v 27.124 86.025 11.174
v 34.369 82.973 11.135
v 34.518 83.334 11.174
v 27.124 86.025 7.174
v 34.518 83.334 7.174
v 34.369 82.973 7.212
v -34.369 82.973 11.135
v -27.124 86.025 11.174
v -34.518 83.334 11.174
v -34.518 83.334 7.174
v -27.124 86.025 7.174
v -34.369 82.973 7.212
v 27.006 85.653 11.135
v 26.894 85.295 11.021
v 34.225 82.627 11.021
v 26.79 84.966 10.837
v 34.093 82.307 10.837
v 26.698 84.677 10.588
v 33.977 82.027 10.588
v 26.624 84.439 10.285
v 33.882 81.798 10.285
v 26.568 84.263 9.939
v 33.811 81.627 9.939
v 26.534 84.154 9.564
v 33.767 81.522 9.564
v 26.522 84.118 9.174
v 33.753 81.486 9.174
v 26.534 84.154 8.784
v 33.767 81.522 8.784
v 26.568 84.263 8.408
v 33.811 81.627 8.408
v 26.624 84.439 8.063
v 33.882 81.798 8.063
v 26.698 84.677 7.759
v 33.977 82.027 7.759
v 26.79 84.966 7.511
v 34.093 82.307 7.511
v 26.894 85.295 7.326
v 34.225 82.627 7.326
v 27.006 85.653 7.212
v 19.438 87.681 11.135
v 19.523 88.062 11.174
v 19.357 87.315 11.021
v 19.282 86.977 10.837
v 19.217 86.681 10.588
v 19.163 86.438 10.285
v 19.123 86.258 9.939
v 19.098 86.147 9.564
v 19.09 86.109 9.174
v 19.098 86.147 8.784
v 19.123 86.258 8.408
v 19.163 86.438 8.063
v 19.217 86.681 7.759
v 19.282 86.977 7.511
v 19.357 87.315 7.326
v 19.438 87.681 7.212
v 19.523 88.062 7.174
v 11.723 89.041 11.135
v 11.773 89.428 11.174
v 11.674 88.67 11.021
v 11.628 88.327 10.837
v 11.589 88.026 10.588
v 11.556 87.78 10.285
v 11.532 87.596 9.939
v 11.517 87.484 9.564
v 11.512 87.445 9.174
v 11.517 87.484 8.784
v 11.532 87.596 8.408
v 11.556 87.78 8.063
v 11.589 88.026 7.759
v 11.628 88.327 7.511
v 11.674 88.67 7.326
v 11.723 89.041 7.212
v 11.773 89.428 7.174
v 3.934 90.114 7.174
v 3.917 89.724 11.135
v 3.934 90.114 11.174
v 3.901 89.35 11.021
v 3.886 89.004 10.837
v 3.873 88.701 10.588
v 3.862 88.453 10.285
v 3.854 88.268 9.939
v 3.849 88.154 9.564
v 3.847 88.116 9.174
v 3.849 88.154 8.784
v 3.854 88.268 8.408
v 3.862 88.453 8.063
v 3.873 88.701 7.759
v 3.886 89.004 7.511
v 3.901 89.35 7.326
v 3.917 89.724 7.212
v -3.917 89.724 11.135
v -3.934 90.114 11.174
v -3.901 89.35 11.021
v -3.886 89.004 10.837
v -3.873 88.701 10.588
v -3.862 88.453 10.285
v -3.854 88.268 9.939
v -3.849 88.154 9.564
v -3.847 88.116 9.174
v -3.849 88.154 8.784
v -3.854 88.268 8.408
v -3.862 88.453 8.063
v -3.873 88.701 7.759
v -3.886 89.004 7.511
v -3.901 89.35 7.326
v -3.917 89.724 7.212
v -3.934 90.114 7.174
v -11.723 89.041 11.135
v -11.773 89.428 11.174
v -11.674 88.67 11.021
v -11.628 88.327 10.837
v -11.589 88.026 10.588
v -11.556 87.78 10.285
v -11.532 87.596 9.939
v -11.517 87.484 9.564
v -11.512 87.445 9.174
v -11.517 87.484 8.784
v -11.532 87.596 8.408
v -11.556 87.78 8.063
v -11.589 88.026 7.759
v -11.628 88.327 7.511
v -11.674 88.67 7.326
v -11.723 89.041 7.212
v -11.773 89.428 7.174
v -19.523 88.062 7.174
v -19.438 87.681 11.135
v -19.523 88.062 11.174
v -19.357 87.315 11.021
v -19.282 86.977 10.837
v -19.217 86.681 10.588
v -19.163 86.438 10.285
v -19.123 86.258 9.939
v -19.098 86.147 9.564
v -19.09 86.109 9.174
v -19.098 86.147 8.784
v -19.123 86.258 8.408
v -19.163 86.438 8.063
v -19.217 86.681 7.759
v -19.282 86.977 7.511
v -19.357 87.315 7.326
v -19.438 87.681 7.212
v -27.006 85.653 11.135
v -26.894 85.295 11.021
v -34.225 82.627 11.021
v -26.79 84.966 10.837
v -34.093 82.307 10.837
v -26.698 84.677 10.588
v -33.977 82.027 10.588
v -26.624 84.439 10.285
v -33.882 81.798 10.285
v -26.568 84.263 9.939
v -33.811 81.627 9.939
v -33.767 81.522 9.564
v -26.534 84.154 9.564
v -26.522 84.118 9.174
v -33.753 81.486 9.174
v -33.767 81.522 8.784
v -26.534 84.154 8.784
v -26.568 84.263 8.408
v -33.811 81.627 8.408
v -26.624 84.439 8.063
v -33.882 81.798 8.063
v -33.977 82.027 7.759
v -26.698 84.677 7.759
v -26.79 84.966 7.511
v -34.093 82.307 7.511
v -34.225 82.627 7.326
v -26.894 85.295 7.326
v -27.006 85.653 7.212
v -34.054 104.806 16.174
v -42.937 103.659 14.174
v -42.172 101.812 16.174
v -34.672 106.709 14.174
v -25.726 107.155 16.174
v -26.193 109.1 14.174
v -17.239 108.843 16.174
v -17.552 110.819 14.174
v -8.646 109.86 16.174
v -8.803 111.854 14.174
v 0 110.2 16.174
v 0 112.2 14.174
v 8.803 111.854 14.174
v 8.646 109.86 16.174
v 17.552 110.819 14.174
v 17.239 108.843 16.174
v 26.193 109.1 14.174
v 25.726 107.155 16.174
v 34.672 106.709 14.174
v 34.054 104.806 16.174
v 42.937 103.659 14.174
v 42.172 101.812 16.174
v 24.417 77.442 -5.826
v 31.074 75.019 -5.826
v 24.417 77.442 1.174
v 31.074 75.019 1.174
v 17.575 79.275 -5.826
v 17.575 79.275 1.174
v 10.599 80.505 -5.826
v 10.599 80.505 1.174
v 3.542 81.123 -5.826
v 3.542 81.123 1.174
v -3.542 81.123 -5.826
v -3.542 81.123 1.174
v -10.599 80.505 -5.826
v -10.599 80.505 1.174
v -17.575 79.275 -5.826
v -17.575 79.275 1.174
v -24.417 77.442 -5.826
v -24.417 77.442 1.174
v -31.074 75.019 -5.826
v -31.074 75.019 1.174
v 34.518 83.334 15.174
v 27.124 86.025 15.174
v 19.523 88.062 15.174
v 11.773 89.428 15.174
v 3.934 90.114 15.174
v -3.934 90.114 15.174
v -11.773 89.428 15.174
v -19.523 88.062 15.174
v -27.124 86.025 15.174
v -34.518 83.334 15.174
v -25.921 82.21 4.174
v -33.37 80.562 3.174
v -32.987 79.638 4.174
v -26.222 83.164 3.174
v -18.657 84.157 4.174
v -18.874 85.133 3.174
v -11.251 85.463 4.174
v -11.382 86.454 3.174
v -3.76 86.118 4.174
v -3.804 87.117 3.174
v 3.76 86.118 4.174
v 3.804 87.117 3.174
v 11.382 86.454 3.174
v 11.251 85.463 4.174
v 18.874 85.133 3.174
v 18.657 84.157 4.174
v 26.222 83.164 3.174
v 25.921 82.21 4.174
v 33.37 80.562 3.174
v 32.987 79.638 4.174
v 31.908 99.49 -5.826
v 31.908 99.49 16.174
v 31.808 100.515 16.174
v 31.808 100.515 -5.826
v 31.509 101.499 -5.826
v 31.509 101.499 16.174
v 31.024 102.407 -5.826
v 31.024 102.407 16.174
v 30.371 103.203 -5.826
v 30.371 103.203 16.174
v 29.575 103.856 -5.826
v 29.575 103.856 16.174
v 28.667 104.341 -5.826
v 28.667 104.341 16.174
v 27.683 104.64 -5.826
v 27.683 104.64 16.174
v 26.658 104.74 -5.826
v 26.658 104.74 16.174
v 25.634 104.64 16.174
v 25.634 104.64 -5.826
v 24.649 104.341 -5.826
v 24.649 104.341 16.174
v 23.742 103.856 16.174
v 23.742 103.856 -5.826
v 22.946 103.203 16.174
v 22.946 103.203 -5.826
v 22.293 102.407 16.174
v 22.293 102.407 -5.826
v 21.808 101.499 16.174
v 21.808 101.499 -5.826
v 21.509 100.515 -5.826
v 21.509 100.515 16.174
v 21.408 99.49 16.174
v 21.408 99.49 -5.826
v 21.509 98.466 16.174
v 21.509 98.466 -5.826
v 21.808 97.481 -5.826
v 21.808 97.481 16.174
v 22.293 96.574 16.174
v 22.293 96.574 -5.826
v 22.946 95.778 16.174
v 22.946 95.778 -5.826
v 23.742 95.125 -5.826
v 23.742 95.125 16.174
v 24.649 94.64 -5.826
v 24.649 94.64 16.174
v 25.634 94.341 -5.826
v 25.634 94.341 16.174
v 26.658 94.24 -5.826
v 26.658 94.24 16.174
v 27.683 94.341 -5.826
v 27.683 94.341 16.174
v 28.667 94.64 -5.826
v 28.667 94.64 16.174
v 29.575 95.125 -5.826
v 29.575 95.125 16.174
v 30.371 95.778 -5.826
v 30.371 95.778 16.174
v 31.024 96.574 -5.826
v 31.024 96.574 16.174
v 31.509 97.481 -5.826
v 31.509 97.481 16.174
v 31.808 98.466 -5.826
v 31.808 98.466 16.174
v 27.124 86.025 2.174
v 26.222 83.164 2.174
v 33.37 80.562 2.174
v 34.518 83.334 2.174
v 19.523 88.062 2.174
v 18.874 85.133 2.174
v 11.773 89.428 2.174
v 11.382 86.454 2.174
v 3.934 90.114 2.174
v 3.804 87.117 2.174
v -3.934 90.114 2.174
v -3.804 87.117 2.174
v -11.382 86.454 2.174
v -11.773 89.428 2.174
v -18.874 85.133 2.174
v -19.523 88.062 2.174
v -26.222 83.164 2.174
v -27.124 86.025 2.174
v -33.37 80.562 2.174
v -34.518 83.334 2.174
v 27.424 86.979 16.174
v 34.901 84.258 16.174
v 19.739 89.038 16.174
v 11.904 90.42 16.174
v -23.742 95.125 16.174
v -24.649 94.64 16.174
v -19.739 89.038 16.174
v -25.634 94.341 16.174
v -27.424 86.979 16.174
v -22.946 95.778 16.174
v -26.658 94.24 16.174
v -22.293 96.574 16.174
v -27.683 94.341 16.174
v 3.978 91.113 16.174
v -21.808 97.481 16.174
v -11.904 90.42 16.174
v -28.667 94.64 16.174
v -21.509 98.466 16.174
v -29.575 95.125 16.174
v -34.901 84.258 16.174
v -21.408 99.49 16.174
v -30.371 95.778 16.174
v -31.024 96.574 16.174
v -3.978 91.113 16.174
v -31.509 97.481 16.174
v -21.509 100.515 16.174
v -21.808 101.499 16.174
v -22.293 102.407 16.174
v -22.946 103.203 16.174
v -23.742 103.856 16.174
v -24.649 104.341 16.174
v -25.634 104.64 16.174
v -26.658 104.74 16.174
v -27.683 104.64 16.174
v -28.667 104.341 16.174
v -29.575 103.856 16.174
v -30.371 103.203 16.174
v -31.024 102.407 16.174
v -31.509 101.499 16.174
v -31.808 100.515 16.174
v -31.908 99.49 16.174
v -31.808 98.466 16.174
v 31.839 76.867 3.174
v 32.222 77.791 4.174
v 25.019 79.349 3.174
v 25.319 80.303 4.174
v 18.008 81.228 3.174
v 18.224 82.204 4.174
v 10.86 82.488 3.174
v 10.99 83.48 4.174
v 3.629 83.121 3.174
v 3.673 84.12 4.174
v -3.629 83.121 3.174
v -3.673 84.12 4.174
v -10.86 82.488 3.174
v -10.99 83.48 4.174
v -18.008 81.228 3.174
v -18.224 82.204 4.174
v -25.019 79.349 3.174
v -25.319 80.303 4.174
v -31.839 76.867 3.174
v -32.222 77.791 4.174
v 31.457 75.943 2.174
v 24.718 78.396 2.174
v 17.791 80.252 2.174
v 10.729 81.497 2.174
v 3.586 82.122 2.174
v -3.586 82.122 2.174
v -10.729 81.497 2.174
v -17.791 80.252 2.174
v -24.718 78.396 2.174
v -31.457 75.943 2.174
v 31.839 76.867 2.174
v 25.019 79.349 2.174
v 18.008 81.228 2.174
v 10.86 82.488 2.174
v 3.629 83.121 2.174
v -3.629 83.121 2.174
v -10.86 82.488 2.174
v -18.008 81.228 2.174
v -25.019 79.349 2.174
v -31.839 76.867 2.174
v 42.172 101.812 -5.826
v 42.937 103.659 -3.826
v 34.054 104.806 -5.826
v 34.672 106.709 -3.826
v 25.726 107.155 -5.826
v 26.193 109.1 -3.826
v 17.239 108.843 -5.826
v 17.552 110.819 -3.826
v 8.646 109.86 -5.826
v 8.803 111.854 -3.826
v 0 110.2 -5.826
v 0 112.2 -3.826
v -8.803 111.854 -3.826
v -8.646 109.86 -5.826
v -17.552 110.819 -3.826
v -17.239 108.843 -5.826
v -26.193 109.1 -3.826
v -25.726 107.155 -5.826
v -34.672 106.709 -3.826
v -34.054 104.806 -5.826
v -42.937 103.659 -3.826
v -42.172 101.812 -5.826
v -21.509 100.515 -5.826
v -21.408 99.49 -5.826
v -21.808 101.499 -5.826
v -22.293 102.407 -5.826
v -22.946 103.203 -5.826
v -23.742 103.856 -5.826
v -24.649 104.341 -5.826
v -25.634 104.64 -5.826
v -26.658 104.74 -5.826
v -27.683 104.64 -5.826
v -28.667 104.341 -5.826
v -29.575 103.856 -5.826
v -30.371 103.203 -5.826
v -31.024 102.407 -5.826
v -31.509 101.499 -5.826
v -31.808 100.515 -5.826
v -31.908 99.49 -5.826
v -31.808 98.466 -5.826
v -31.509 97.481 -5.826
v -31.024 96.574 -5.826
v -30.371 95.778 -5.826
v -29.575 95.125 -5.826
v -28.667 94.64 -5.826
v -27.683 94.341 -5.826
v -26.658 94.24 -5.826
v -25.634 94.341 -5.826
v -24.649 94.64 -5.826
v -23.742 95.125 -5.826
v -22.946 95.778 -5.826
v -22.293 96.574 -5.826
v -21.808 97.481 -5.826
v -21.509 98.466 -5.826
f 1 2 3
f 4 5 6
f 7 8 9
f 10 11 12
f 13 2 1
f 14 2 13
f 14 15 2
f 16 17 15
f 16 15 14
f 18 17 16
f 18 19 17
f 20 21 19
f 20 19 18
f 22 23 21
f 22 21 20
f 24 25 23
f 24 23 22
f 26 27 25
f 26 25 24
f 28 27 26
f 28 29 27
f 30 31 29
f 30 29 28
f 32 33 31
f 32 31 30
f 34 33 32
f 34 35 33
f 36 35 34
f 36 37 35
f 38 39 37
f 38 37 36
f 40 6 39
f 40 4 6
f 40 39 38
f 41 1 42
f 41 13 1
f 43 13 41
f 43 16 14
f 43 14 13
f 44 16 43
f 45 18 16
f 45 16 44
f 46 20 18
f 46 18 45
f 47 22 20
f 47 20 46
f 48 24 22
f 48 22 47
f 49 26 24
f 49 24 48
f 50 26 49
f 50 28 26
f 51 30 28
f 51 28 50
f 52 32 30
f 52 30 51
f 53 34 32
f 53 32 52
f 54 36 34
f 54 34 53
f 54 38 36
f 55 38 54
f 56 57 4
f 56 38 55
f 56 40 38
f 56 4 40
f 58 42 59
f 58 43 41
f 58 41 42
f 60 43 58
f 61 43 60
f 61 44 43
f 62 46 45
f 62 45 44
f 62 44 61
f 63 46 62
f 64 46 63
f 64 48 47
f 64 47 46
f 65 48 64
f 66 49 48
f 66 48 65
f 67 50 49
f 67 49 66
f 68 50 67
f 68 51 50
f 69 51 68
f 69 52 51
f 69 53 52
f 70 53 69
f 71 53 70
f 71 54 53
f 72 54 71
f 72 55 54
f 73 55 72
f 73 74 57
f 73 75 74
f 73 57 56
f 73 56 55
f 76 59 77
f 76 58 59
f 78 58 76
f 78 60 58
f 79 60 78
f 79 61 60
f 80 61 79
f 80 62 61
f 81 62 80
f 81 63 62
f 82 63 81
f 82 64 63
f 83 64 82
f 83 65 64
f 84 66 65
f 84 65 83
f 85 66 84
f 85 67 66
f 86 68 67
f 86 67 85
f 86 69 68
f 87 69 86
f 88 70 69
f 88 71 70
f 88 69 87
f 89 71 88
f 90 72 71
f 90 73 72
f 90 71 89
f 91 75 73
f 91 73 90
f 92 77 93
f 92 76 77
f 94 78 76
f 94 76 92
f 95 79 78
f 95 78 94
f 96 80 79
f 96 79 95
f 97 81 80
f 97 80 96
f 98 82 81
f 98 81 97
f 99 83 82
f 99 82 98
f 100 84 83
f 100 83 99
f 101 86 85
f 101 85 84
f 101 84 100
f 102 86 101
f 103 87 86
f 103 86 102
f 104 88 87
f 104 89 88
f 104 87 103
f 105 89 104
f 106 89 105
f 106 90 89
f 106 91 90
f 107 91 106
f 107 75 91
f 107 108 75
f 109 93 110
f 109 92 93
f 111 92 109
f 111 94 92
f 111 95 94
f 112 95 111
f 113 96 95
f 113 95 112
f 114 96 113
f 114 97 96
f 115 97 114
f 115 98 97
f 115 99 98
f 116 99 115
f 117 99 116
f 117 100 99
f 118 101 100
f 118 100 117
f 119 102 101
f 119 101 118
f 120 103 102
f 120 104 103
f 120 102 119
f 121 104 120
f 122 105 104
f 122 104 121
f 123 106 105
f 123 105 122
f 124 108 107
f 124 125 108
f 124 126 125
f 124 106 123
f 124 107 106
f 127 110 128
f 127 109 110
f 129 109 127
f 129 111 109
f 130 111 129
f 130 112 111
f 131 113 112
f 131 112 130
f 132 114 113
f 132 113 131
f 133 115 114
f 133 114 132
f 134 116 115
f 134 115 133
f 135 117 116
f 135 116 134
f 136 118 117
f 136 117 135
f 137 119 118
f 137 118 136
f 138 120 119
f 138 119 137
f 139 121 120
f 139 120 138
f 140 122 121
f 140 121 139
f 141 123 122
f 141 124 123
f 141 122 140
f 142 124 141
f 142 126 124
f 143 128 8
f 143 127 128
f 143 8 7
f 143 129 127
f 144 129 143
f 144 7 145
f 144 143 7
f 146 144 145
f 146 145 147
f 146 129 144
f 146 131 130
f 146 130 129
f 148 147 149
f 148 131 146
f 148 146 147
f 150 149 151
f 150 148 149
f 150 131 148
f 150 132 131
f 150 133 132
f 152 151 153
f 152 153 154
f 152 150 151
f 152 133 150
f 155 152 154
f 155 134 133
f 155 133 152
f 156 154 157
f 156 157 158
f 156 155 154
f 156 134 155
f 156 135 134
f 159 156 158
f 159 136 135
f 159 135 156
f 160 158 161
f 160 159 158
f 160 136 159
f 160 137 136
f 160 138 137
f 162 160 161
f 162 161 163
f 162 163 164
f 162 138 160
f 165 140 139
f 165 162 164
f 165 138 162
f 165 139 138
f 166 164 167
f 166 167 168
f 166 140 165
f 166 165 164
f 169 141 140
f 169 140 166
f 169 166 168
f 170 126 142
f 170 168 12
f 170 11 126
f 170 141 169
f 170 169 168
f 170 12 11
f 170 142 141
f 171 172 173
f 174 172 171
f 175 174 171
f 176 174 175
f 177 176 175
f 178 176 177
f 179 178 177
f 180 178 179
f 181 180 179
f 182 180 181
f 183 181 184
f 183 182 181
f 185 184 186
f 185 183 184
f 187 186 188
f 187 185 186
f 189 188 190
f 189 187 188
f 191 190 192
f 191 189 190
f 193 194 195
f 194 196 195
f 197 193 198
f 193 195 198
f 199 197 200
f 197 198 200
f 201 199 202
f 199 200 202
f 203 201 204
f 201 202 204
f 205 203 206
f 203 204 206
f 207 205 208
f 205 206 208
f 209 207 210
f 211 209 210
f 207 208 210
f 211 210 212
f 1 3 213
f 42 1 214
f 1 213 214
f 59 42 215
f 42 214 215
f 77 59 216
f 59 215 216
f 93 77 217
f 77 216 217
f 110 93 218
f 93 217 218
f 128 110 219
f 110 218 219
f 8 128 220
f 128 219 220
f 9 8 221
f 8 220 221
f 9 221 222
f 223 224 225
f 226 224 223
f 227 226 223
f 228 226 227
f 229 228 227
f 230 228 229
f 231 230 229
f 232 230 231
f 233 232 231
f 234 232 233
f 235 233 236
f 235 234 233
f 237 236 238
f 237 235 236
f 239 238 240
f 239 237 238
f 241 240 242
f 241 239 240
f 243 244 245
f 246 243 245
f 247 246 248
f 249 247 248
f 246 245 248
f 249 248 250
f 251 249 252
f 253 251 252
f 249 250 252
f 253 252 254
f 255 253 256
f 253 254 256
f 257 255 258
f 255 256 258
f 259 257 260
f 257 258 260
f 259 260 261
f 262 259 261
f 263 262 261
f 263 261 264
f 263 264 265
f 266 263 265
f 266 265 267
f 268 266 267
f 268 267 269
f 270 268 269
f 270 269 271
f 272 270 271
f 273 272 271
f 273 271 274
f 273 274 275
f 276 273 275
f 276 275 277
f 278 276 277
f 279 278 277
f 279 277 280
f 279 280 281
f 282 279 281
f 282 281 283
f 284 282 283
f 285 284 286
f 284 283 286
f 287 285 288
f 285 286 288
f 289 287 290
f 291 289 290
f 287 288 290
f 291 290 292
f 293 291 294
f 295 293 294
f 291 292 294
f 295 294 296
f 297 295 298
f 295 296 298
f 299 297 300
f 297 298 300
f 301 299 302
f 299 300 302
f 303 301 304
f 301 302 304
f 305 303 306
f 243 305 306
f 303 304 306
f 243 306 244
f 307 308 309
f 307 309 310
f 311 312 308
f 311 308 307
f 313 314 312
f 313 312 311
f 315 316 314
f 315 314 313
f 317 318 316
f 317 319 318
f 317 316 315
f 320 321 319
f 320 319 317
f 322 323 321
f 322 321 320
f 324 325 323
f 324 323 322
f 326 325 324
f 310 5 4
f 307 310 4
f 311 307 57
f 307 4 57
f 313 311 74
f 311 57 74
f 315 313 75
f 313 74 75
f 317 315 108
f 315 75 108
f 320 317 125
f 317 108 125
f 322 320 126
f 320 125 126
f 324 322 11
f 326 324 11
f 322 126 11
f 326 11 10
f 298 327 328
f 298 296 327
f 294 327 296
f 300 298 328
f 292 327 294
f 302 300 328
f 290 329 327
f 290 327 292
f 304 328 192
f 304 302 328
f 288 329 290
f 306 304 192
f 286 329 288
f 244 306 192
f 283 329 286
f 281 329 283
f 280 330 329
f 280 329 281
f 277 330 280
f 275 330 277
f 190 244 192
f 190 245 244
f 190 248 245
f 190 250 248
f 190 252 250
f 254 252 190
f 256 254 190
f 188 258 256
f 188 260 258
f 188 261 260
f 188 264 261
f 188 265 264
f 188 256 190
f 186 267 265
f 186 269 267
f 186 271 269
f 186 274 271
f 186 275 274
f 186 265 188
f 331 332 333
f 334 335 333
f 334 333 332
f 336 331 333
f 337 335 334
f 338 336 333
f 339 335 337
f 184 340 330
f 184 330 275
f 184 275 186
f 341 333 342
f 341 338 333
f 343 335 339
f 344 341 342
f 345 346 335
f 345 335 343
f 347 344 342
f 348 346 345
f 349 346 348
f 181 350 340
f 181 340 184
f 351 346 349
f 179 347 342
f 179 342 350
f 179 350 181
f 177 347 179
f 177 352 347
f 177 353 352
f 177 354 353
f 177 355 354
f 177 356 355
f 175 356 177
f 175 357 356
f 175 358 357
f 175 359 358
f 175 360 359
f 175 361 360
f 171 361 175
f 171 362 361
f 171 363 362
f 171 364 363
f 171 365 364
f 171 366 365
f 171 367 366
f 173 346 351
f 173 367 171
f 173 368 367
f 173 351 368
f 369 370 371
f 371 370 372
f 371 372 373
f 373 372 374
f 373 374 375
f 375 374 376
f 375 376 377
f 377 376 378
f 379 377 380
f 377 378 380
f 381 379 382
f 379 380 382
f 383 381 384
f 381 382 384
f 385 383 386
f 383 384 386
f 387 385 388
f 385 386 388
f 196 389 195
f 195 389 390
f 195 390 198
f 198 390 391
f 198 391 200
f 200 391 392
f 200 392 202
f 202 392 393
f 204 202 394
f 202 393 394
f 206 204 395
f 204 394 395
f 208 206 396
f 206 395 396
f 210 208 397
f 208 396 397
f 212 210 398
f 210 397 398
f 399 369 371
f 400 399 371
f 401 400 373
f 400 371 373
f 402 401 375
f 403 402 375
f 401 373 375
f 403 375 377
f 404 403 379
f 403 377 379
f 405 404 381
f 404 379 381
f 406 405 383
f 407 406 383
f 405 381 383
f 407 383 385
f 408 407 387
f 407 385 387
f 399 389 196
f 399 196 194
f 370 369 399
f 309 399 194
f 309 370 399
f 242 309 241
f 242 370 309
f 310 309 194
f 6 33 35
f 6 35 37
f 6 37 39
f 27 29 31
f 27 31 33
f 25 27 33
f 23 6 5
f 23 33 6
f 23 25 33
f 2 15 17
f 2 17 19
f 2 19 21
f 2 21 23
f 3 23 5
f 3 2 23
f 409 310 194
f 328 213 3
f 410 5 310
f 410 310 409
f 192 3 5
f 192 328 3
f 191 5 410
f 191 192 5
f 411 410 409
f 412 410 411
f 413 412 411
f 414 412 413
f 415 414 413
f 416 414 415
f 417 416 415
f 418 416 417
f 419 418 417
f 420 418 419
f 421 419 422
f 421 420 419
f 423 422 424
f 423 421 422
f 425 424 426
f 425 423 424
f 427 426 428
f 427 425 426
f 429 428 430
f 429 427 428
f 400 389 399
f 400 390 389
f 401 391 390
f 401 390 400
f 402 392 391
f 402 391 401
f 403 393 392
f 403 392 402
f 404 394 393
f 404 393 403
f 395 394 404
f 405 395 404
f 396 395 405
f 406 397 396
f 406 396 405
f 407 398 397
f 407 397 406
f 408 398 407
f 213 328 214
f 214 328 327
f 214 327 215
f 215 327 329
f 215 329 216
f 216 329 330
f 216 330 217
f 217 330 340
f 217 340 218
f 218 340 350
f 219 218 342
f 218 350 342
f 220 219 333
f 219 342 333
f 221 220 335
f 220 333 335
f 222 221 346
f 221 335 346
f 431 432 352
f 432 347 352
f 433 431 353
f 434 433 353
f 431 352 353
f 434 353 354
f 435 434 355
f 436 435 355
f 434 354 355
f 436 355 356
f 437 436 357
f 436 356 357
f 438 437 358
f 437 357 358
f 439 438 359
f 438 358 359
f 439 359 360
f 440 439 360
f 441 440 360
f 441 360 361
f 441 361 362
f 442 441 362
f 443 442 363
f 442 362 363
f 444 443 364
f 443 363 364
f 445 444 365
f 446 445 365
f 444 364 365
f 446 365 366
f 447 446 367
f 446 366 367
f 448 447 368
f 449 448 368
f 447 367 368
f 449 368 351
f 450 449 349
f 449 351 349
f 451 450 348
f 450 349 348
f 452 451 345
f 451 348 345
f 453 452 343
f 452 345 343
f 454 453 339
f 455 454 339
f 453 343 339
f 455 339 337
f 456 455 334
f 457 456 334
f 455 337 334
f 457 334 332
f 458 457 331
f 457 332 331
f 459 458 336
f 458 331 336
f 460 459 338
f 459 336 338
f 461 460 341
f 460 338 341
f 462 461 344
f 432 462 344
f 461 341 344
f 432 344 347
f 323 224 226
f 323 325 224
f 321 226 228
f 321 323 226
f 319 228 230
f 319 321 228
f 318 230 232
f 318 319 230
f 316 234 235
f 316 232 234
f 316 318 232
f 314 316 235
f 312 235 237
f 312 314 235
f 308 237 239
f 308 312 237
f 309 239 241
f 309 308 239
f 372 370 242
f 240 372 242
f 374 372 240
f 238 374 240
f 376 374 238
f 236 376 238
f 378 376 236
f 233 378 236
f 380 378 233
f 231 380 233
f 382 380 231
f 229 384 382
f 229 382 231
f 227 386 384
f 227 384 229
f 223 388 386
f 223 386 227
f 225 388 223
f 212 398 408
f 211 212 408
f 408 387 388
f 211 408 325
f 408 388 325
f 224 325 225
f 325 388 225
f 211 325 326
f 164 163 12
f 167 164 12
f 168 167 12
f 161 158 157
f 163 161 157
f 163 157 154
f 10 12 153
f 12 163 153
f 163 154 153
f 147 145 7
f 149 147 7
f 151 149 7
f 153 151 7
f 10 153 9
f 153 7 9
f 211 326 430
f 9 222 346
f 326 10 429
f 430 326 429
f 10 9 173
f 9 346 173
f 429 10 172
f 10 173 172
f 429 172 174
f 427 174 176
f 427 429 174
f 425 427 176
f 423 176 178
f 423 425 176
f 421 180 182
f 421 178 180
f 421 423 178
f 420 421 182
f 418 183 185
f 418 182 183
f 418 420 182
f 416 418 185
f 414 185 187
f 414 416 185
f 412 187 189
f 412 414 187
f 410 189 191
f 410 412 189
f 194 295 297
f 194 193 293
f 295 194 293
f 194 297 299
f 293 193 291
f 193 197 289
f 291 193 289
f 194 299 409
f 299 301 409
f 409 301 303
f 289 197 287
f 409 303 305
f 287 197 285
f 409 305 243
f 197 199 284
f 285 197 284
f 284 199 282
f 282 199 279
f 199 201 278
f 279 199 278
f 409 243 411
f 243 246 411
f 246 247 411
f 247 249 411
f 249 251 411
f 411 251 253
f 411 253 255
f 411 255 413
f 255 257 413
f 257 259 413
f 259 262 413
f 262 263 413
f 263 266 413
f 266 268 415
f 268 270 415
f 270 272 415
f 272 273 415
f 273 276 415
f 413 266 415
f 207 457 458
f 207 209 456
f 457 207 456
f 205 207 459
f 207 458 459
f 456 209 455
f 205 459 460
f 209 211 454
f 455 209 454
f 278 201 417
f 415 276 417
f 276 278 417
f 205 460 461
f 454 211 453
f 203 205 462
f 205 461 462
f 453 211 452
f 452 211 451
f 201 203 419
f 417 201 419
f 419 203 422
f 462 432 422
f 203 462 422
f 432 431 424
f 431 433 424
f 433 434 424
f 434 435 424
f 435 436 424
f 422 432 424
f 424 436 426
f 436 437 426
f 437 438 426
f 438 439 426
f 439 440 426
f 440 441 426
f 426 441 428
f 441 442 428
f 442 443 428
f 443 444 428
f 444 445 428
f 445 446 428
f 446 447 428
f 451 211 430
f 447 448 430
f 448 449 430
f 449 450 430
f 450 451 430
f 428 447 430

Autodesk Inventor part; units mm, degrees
ref_plane "YZ Plane" through (0, 0, 0) normal (1, 0, 0) x (0, 1, 0)
ref_plane "XZ Plane" through (0, 0, 0) normal (0, 1, 0) x (-1, 0, 0)
ref_plane "XY Plane" through (0, 0, 0) normal (0, 0, 1) x (1, 0, 0)
sketch "Sketch1" plane through (0, 0, 0) normal (1, 0, 0) x (0, 1, 0)
  line L0 (81.2, 2.1737) -> (83.2, 2.1737)
  line L1 (83.2, 2.1737) -> (83.2, 4.1737)
  line L2 (83.2, 4.1737) -> (87.2, 4.1737)
  line L3 (87.2, 4.1737) -> (87.2, 2.1737)
  line L4 (87.2, 2.1737) -> (90.2, 2.1737)
  line L5 (90.2, 2.1737) -> (90.2, 7.1737)
  arc A0 (90.2, 11.1737) -> (90.2, 7.1737) centre (90.2, 9.1737) ccw
  line L6 (90.2, 11.1737) -> (90.2, 16.1737)
  line L7 (90.2, 16.1737) -> (92.2, 16.1737)
  line L8 (92.2, 16.1737) -> (92.2, 16.1737)
  line L9 (92.2, 16.1737) -> (112.2, 16.1737)
  line L10 (112.2, 16.1737) -> (112.2, -5.8263)
  line L11 (112.2, -5.8263) -> (81.2, -5.8263)
  line L12 (81.2, -5.8263) -> (81.2, 2.1737)
  line L13 (90.2, 11.1737) -> (90.2, 7.1737) construction
  line L14 (0, -10.2263) -> (0, 20.5737) projected
  point P0 (0, 0)
  dimension "d0" = 4
  dimension "d1" = 9
  dimension "d2" = 3
  dimension "d3" = 2
  dimension "d4" = 5
  dimension "d5" = 4
  dimension "d6" = 90.2
  dimension "d8" = 20
  dimension "d9" = 2
  dimension "d21" = 81.2
  dimension "d22" = 8
  dimension "d23" = 14
  dimension "d25" = 22
  dimension "d40" = 0
revolve "Revolution1" add sketch "Sketch1" angle 45 mid plane about axis through (0, 0, -10) along (0, 0, 1)
chamfer "Chamfer2" distance 1 angle 45 4 edges at (0, 83.2, 4.1737) (0, 87.2, 4.1737) (0, 81.2, 2.1737) (0, 90.2, 16.1737)
chamfer "Chamfer3" distance 2 angle 45 2 edges at (0, 112.2, -5.8263) (0, 112.2, 16.1737)
sketch "Sketch5" plane through (0, 0, 16.1737) normal (0, 0, 1) x (1, 0, 0)
  circle A0 centre (26.6584, 99.4904) radius 5.25
  circle A1 centre (-26.6584, 99.4904) radius 5.25
  arc A2 (-1.1976, 102.993) -> (-50.3773, 89.8395) centre (0, 0) ccw construction
  line L0 (0, 0) -> (-26.6584, 99.4904) construction
  line L1 (0, -22.44) -> (0, 134.64) construction
  dimension "d41" = 103
  dimension "d42" = 10.5
  dimension "d43" = 15
extrude "Extrusion4" cut sketch "Sketch5" against normal through all
properties part number "prueba_clamp_iso160"
